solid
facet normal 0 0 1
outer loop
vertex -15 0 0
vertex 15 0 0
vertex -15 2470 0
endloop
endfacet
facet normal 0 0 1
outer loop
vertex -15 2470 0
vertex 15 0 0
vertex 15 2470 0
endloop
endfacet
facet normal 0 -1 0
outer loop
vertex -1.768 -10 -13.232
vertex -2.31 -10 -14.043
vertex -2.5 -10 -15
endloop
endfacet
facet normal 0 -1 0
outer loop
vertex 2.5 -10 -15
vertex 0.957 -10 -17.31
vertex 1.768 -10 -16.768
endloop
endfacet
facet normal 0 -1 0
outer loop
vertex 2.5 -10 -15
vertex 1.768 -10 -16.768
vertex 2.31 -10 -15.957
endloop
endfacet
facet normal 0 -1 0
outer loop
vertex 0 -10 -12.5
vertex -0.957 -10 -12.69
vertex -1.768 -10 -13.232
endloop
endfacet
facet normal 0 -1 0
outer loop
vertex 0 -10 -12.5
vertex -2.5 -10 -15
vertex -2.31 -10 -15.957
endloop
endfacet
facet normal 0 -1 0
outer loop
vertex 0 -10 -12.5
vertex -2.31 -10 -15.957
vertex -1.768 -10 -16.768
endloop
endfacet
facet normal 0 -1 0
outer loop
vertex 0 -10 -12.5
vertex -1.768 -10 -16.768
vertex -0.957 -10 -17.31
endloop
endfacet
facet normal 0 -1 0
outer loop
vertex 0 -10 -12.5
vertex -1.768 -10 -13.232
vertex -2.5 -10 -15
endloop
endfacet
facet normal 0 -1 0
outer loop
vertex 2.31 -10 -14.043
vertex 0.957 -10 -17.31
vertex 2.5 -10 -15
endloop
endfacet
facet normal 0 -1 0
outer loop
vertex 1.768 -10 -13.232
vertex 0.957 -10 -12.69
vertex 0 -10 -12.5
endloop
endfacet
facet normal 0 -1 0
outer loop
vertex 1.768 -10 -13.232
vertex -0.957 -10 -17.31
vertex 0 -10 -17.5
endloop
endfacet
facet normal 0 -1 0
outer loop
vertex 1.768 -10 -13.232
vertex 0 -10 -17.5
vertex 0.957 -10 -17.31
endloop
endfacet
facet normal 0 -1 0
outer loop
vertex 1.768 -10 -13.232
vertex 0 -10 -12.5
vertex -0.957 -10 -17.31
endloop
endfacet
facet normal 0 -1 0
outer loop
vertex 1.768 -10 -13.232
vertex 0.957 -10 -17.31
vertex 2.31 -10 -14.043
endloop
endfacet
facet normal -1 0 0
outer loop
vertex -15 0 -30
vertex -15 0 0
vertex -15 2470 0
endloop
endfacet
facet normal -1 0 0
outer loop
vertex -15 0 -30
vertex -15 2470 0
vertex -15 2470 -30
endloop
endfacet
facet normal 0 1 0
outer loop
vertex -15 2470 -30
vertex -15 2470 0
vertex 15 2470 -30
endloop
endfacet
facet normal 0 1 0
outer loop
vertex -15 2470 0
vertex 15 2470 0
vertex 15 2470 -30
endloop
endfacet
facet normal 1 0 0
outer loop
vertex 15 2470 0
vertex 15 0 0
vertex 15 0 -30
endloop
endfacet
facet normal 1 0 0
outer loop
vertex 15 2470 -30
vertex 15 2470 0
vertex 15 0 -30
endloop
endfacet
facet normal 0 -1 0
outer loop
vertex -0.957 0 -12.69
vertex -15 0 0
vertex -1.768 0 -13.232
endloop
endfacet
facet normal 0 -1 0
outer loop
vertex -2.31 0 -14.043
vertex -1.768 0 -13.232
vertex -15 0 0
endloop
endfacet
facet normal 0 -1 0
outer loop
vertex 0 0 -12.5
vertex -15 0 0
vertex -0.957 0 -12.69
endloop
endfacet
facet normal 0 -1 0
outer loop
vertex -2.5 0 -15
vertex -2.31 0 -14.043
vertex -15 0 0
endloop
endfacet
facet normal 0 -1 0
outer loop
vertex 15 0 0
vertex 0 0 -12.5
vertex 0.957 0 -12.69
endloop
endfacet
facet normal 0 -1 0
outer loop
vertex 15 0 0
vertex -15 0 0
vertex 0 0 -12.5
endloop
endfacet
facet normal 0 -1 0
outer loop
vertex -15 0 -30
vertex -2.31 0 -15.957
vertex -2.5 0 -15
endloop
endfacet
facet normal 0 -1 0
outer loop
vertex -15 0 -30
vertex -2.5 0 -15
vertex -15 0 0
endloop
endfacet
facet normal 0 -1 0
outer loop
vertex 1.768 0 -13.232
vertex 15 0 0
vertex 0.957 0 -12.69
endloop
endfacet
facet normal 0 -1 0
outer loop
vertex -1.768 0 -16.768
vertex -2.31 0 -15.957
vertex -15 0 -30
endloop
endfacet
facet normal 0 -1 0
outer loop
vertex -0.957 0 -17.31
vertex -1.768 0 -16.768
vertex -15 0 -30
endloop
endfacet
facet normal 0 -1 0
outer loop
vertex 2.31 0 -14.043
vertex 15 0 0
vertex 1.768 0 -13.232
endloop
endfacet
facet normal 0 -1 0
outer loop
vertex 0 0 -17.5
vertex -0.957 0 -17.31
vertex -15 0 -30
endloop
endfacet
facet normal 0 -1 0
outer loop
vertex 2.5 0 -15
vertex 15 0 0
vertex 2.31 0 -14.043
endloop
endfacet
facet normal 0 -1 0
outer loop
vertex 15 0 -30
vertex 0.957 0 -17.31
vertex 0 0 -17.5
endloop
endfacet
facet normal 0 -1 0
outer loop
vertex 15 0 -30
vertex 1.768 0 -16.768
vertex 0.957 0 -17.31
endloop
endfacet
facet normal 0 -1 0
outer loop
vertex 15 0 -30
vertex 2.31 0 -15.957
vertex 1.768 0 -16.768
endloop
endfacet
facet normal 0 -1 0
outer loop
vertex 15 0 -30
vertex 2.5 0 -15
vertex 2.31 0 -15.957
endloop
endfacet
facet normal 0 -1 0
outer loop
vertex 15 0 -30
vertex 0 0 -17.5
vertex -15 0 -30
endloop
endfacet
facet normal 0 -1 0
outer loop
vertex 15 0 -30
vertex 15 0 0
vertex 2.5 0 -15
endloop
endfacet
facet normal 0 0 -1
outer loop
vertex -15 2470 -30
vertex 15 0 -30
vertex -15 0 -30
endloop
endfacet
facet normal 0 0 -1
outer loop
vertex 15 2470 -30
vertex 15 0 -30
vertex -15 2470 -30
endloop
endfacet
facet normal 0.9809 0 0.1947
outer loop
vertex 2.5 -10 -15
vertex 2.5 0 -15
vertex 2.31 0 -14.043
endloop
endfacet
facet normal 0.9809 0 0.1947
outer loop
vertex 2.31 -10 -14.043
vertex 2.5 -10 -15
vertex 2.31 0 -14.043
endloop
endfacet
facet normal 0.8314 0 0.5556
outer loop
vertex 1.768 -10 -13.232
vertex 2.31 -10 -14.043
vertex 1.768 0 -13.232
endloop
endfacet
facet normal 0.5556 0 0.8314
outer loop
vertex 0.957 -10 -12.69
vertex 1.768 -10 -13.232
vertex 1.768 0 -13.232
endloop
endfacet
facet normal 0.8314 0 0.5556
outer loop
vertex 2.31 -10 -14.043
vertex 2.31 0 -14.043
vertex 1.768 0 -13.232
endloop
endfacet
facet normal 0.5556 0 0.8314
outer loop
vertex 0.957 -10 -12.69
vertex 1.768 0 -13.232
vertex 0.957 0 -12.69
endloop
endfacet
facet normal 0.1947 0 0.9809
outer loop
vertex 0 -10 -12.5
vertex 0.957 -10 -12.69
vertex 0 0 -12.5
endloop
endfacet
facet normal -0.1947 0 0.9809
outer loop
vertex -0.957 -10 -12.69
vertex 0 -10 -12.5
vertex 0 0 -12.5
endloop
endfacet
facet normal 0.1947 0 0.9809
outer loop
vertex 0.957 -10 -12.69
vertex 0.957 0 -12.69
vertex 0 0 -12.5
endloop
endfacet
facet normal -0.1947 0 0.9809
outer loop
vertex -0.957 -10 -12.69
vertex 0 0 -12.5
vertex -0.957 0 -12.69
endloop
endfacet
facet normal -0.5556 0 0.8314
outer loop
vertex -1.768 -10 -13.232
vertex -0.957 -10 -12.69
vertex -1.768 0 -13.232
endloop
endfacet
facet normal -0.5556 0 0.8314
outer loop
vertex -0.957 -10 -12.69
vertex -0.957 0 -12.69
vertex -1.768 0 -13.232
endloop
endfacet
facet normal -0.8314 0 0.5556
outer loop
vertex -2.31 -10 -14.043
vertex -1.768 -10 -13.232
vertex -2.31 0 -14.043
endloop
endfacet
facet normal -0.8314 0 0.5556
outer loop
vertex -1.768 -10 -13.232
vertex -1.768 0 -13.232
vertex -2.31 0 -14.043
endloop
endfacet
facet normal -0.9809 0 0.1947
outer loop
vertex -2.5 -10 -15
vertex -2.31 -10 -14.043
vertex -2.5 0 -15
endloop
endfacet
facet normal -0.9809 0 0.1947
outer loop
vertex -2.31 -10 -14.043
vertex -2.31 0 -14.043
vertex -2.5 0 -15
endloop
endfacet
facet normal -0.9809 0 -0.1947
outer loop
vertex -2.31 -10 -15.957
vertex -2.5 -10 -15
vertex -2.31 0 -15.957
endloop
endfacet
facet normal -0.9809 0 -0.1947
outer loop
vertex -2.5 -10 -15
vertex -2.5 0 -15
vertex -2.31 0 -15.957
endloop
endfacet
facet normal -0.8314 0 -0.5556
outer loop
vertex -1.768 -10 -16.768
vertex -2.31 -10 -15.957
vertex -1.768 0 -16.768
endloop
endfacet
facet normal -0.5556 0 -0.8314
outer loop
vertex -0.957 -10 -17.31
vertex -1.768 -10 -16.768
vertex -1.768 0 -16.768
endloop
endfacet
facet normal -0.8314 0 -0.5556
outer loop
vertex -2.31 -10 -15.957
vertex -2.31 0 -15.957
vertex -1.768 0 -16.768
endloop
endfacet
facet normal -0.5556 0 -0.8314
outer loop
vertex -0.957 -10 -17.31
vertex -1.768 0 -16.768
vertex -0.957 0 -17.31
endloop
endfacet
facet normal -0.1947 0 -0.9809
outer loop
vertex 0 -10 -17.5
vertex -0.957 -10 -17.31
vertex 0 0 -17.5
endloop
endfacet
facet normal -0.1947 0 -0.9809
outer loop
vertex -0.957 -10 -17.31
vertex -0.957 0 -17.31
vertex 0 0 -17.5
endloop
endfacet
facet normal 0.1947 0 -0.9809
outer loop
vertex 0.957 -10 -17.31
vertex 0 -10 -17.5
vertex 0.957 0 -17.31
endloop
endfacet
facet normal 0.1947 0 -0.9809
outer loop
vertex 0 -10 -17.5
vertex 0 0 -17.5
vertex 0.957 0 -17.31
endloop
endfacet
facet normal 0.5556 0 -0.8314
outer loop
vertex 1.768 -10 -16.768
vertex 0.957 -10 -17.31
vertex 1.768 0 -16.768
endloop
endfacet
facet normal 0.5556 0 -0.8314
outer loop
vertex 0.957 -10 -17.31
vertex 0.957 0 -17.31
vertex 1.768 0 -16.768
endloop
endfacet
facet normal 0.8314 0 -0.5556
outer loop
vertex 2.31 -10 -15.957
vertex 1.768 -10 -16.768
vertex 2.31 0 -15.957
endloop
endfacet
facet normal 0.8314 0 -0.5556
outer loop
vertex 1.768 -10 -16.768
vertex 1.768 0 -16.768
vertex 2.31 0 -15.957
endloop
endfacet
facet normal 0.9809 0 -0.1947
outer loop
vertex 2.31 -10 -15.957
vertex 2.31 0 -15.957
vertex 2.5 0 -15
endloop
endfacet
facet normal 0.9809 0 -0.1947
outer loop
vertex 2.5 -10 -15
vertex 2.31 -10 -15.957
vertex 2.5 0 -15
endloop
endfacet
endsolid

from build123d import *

# Parameters (mm, degrees)
SKETCH1_W           = 30
SKETCH1_H           = 2470
BOSS_EXTRUDE1_DEPTH = 15
SKETCH2_R           = 2.5
BOSS_EXTRUDE2_DEPTH = 10


with BuildPart() as part:
    # Sketch1 → Boss-Extrude1 (new body, symmetric)
    with BuildSketch(Plane(origin=(0, 0, 0), x_dir=(0, 0, -1), z_dir=(1, 0, 0))):
        with Locations((15, 1235)):
            Rectangle(SKETCH1_W, SKETCH1_H)
    extrude(amount=BOSS_EXTRUDE1_DEPTH, both=True)

    # Sketch2 → Boss-Extrude2 (add)
    with BuildSketch(Plane.XZ):
        with Locations((0, -15)):
            Circle(SKETCH2_R)
    extrude(amount=BOSS_EXTRUDE2_DEPTH)


solid = part.part
